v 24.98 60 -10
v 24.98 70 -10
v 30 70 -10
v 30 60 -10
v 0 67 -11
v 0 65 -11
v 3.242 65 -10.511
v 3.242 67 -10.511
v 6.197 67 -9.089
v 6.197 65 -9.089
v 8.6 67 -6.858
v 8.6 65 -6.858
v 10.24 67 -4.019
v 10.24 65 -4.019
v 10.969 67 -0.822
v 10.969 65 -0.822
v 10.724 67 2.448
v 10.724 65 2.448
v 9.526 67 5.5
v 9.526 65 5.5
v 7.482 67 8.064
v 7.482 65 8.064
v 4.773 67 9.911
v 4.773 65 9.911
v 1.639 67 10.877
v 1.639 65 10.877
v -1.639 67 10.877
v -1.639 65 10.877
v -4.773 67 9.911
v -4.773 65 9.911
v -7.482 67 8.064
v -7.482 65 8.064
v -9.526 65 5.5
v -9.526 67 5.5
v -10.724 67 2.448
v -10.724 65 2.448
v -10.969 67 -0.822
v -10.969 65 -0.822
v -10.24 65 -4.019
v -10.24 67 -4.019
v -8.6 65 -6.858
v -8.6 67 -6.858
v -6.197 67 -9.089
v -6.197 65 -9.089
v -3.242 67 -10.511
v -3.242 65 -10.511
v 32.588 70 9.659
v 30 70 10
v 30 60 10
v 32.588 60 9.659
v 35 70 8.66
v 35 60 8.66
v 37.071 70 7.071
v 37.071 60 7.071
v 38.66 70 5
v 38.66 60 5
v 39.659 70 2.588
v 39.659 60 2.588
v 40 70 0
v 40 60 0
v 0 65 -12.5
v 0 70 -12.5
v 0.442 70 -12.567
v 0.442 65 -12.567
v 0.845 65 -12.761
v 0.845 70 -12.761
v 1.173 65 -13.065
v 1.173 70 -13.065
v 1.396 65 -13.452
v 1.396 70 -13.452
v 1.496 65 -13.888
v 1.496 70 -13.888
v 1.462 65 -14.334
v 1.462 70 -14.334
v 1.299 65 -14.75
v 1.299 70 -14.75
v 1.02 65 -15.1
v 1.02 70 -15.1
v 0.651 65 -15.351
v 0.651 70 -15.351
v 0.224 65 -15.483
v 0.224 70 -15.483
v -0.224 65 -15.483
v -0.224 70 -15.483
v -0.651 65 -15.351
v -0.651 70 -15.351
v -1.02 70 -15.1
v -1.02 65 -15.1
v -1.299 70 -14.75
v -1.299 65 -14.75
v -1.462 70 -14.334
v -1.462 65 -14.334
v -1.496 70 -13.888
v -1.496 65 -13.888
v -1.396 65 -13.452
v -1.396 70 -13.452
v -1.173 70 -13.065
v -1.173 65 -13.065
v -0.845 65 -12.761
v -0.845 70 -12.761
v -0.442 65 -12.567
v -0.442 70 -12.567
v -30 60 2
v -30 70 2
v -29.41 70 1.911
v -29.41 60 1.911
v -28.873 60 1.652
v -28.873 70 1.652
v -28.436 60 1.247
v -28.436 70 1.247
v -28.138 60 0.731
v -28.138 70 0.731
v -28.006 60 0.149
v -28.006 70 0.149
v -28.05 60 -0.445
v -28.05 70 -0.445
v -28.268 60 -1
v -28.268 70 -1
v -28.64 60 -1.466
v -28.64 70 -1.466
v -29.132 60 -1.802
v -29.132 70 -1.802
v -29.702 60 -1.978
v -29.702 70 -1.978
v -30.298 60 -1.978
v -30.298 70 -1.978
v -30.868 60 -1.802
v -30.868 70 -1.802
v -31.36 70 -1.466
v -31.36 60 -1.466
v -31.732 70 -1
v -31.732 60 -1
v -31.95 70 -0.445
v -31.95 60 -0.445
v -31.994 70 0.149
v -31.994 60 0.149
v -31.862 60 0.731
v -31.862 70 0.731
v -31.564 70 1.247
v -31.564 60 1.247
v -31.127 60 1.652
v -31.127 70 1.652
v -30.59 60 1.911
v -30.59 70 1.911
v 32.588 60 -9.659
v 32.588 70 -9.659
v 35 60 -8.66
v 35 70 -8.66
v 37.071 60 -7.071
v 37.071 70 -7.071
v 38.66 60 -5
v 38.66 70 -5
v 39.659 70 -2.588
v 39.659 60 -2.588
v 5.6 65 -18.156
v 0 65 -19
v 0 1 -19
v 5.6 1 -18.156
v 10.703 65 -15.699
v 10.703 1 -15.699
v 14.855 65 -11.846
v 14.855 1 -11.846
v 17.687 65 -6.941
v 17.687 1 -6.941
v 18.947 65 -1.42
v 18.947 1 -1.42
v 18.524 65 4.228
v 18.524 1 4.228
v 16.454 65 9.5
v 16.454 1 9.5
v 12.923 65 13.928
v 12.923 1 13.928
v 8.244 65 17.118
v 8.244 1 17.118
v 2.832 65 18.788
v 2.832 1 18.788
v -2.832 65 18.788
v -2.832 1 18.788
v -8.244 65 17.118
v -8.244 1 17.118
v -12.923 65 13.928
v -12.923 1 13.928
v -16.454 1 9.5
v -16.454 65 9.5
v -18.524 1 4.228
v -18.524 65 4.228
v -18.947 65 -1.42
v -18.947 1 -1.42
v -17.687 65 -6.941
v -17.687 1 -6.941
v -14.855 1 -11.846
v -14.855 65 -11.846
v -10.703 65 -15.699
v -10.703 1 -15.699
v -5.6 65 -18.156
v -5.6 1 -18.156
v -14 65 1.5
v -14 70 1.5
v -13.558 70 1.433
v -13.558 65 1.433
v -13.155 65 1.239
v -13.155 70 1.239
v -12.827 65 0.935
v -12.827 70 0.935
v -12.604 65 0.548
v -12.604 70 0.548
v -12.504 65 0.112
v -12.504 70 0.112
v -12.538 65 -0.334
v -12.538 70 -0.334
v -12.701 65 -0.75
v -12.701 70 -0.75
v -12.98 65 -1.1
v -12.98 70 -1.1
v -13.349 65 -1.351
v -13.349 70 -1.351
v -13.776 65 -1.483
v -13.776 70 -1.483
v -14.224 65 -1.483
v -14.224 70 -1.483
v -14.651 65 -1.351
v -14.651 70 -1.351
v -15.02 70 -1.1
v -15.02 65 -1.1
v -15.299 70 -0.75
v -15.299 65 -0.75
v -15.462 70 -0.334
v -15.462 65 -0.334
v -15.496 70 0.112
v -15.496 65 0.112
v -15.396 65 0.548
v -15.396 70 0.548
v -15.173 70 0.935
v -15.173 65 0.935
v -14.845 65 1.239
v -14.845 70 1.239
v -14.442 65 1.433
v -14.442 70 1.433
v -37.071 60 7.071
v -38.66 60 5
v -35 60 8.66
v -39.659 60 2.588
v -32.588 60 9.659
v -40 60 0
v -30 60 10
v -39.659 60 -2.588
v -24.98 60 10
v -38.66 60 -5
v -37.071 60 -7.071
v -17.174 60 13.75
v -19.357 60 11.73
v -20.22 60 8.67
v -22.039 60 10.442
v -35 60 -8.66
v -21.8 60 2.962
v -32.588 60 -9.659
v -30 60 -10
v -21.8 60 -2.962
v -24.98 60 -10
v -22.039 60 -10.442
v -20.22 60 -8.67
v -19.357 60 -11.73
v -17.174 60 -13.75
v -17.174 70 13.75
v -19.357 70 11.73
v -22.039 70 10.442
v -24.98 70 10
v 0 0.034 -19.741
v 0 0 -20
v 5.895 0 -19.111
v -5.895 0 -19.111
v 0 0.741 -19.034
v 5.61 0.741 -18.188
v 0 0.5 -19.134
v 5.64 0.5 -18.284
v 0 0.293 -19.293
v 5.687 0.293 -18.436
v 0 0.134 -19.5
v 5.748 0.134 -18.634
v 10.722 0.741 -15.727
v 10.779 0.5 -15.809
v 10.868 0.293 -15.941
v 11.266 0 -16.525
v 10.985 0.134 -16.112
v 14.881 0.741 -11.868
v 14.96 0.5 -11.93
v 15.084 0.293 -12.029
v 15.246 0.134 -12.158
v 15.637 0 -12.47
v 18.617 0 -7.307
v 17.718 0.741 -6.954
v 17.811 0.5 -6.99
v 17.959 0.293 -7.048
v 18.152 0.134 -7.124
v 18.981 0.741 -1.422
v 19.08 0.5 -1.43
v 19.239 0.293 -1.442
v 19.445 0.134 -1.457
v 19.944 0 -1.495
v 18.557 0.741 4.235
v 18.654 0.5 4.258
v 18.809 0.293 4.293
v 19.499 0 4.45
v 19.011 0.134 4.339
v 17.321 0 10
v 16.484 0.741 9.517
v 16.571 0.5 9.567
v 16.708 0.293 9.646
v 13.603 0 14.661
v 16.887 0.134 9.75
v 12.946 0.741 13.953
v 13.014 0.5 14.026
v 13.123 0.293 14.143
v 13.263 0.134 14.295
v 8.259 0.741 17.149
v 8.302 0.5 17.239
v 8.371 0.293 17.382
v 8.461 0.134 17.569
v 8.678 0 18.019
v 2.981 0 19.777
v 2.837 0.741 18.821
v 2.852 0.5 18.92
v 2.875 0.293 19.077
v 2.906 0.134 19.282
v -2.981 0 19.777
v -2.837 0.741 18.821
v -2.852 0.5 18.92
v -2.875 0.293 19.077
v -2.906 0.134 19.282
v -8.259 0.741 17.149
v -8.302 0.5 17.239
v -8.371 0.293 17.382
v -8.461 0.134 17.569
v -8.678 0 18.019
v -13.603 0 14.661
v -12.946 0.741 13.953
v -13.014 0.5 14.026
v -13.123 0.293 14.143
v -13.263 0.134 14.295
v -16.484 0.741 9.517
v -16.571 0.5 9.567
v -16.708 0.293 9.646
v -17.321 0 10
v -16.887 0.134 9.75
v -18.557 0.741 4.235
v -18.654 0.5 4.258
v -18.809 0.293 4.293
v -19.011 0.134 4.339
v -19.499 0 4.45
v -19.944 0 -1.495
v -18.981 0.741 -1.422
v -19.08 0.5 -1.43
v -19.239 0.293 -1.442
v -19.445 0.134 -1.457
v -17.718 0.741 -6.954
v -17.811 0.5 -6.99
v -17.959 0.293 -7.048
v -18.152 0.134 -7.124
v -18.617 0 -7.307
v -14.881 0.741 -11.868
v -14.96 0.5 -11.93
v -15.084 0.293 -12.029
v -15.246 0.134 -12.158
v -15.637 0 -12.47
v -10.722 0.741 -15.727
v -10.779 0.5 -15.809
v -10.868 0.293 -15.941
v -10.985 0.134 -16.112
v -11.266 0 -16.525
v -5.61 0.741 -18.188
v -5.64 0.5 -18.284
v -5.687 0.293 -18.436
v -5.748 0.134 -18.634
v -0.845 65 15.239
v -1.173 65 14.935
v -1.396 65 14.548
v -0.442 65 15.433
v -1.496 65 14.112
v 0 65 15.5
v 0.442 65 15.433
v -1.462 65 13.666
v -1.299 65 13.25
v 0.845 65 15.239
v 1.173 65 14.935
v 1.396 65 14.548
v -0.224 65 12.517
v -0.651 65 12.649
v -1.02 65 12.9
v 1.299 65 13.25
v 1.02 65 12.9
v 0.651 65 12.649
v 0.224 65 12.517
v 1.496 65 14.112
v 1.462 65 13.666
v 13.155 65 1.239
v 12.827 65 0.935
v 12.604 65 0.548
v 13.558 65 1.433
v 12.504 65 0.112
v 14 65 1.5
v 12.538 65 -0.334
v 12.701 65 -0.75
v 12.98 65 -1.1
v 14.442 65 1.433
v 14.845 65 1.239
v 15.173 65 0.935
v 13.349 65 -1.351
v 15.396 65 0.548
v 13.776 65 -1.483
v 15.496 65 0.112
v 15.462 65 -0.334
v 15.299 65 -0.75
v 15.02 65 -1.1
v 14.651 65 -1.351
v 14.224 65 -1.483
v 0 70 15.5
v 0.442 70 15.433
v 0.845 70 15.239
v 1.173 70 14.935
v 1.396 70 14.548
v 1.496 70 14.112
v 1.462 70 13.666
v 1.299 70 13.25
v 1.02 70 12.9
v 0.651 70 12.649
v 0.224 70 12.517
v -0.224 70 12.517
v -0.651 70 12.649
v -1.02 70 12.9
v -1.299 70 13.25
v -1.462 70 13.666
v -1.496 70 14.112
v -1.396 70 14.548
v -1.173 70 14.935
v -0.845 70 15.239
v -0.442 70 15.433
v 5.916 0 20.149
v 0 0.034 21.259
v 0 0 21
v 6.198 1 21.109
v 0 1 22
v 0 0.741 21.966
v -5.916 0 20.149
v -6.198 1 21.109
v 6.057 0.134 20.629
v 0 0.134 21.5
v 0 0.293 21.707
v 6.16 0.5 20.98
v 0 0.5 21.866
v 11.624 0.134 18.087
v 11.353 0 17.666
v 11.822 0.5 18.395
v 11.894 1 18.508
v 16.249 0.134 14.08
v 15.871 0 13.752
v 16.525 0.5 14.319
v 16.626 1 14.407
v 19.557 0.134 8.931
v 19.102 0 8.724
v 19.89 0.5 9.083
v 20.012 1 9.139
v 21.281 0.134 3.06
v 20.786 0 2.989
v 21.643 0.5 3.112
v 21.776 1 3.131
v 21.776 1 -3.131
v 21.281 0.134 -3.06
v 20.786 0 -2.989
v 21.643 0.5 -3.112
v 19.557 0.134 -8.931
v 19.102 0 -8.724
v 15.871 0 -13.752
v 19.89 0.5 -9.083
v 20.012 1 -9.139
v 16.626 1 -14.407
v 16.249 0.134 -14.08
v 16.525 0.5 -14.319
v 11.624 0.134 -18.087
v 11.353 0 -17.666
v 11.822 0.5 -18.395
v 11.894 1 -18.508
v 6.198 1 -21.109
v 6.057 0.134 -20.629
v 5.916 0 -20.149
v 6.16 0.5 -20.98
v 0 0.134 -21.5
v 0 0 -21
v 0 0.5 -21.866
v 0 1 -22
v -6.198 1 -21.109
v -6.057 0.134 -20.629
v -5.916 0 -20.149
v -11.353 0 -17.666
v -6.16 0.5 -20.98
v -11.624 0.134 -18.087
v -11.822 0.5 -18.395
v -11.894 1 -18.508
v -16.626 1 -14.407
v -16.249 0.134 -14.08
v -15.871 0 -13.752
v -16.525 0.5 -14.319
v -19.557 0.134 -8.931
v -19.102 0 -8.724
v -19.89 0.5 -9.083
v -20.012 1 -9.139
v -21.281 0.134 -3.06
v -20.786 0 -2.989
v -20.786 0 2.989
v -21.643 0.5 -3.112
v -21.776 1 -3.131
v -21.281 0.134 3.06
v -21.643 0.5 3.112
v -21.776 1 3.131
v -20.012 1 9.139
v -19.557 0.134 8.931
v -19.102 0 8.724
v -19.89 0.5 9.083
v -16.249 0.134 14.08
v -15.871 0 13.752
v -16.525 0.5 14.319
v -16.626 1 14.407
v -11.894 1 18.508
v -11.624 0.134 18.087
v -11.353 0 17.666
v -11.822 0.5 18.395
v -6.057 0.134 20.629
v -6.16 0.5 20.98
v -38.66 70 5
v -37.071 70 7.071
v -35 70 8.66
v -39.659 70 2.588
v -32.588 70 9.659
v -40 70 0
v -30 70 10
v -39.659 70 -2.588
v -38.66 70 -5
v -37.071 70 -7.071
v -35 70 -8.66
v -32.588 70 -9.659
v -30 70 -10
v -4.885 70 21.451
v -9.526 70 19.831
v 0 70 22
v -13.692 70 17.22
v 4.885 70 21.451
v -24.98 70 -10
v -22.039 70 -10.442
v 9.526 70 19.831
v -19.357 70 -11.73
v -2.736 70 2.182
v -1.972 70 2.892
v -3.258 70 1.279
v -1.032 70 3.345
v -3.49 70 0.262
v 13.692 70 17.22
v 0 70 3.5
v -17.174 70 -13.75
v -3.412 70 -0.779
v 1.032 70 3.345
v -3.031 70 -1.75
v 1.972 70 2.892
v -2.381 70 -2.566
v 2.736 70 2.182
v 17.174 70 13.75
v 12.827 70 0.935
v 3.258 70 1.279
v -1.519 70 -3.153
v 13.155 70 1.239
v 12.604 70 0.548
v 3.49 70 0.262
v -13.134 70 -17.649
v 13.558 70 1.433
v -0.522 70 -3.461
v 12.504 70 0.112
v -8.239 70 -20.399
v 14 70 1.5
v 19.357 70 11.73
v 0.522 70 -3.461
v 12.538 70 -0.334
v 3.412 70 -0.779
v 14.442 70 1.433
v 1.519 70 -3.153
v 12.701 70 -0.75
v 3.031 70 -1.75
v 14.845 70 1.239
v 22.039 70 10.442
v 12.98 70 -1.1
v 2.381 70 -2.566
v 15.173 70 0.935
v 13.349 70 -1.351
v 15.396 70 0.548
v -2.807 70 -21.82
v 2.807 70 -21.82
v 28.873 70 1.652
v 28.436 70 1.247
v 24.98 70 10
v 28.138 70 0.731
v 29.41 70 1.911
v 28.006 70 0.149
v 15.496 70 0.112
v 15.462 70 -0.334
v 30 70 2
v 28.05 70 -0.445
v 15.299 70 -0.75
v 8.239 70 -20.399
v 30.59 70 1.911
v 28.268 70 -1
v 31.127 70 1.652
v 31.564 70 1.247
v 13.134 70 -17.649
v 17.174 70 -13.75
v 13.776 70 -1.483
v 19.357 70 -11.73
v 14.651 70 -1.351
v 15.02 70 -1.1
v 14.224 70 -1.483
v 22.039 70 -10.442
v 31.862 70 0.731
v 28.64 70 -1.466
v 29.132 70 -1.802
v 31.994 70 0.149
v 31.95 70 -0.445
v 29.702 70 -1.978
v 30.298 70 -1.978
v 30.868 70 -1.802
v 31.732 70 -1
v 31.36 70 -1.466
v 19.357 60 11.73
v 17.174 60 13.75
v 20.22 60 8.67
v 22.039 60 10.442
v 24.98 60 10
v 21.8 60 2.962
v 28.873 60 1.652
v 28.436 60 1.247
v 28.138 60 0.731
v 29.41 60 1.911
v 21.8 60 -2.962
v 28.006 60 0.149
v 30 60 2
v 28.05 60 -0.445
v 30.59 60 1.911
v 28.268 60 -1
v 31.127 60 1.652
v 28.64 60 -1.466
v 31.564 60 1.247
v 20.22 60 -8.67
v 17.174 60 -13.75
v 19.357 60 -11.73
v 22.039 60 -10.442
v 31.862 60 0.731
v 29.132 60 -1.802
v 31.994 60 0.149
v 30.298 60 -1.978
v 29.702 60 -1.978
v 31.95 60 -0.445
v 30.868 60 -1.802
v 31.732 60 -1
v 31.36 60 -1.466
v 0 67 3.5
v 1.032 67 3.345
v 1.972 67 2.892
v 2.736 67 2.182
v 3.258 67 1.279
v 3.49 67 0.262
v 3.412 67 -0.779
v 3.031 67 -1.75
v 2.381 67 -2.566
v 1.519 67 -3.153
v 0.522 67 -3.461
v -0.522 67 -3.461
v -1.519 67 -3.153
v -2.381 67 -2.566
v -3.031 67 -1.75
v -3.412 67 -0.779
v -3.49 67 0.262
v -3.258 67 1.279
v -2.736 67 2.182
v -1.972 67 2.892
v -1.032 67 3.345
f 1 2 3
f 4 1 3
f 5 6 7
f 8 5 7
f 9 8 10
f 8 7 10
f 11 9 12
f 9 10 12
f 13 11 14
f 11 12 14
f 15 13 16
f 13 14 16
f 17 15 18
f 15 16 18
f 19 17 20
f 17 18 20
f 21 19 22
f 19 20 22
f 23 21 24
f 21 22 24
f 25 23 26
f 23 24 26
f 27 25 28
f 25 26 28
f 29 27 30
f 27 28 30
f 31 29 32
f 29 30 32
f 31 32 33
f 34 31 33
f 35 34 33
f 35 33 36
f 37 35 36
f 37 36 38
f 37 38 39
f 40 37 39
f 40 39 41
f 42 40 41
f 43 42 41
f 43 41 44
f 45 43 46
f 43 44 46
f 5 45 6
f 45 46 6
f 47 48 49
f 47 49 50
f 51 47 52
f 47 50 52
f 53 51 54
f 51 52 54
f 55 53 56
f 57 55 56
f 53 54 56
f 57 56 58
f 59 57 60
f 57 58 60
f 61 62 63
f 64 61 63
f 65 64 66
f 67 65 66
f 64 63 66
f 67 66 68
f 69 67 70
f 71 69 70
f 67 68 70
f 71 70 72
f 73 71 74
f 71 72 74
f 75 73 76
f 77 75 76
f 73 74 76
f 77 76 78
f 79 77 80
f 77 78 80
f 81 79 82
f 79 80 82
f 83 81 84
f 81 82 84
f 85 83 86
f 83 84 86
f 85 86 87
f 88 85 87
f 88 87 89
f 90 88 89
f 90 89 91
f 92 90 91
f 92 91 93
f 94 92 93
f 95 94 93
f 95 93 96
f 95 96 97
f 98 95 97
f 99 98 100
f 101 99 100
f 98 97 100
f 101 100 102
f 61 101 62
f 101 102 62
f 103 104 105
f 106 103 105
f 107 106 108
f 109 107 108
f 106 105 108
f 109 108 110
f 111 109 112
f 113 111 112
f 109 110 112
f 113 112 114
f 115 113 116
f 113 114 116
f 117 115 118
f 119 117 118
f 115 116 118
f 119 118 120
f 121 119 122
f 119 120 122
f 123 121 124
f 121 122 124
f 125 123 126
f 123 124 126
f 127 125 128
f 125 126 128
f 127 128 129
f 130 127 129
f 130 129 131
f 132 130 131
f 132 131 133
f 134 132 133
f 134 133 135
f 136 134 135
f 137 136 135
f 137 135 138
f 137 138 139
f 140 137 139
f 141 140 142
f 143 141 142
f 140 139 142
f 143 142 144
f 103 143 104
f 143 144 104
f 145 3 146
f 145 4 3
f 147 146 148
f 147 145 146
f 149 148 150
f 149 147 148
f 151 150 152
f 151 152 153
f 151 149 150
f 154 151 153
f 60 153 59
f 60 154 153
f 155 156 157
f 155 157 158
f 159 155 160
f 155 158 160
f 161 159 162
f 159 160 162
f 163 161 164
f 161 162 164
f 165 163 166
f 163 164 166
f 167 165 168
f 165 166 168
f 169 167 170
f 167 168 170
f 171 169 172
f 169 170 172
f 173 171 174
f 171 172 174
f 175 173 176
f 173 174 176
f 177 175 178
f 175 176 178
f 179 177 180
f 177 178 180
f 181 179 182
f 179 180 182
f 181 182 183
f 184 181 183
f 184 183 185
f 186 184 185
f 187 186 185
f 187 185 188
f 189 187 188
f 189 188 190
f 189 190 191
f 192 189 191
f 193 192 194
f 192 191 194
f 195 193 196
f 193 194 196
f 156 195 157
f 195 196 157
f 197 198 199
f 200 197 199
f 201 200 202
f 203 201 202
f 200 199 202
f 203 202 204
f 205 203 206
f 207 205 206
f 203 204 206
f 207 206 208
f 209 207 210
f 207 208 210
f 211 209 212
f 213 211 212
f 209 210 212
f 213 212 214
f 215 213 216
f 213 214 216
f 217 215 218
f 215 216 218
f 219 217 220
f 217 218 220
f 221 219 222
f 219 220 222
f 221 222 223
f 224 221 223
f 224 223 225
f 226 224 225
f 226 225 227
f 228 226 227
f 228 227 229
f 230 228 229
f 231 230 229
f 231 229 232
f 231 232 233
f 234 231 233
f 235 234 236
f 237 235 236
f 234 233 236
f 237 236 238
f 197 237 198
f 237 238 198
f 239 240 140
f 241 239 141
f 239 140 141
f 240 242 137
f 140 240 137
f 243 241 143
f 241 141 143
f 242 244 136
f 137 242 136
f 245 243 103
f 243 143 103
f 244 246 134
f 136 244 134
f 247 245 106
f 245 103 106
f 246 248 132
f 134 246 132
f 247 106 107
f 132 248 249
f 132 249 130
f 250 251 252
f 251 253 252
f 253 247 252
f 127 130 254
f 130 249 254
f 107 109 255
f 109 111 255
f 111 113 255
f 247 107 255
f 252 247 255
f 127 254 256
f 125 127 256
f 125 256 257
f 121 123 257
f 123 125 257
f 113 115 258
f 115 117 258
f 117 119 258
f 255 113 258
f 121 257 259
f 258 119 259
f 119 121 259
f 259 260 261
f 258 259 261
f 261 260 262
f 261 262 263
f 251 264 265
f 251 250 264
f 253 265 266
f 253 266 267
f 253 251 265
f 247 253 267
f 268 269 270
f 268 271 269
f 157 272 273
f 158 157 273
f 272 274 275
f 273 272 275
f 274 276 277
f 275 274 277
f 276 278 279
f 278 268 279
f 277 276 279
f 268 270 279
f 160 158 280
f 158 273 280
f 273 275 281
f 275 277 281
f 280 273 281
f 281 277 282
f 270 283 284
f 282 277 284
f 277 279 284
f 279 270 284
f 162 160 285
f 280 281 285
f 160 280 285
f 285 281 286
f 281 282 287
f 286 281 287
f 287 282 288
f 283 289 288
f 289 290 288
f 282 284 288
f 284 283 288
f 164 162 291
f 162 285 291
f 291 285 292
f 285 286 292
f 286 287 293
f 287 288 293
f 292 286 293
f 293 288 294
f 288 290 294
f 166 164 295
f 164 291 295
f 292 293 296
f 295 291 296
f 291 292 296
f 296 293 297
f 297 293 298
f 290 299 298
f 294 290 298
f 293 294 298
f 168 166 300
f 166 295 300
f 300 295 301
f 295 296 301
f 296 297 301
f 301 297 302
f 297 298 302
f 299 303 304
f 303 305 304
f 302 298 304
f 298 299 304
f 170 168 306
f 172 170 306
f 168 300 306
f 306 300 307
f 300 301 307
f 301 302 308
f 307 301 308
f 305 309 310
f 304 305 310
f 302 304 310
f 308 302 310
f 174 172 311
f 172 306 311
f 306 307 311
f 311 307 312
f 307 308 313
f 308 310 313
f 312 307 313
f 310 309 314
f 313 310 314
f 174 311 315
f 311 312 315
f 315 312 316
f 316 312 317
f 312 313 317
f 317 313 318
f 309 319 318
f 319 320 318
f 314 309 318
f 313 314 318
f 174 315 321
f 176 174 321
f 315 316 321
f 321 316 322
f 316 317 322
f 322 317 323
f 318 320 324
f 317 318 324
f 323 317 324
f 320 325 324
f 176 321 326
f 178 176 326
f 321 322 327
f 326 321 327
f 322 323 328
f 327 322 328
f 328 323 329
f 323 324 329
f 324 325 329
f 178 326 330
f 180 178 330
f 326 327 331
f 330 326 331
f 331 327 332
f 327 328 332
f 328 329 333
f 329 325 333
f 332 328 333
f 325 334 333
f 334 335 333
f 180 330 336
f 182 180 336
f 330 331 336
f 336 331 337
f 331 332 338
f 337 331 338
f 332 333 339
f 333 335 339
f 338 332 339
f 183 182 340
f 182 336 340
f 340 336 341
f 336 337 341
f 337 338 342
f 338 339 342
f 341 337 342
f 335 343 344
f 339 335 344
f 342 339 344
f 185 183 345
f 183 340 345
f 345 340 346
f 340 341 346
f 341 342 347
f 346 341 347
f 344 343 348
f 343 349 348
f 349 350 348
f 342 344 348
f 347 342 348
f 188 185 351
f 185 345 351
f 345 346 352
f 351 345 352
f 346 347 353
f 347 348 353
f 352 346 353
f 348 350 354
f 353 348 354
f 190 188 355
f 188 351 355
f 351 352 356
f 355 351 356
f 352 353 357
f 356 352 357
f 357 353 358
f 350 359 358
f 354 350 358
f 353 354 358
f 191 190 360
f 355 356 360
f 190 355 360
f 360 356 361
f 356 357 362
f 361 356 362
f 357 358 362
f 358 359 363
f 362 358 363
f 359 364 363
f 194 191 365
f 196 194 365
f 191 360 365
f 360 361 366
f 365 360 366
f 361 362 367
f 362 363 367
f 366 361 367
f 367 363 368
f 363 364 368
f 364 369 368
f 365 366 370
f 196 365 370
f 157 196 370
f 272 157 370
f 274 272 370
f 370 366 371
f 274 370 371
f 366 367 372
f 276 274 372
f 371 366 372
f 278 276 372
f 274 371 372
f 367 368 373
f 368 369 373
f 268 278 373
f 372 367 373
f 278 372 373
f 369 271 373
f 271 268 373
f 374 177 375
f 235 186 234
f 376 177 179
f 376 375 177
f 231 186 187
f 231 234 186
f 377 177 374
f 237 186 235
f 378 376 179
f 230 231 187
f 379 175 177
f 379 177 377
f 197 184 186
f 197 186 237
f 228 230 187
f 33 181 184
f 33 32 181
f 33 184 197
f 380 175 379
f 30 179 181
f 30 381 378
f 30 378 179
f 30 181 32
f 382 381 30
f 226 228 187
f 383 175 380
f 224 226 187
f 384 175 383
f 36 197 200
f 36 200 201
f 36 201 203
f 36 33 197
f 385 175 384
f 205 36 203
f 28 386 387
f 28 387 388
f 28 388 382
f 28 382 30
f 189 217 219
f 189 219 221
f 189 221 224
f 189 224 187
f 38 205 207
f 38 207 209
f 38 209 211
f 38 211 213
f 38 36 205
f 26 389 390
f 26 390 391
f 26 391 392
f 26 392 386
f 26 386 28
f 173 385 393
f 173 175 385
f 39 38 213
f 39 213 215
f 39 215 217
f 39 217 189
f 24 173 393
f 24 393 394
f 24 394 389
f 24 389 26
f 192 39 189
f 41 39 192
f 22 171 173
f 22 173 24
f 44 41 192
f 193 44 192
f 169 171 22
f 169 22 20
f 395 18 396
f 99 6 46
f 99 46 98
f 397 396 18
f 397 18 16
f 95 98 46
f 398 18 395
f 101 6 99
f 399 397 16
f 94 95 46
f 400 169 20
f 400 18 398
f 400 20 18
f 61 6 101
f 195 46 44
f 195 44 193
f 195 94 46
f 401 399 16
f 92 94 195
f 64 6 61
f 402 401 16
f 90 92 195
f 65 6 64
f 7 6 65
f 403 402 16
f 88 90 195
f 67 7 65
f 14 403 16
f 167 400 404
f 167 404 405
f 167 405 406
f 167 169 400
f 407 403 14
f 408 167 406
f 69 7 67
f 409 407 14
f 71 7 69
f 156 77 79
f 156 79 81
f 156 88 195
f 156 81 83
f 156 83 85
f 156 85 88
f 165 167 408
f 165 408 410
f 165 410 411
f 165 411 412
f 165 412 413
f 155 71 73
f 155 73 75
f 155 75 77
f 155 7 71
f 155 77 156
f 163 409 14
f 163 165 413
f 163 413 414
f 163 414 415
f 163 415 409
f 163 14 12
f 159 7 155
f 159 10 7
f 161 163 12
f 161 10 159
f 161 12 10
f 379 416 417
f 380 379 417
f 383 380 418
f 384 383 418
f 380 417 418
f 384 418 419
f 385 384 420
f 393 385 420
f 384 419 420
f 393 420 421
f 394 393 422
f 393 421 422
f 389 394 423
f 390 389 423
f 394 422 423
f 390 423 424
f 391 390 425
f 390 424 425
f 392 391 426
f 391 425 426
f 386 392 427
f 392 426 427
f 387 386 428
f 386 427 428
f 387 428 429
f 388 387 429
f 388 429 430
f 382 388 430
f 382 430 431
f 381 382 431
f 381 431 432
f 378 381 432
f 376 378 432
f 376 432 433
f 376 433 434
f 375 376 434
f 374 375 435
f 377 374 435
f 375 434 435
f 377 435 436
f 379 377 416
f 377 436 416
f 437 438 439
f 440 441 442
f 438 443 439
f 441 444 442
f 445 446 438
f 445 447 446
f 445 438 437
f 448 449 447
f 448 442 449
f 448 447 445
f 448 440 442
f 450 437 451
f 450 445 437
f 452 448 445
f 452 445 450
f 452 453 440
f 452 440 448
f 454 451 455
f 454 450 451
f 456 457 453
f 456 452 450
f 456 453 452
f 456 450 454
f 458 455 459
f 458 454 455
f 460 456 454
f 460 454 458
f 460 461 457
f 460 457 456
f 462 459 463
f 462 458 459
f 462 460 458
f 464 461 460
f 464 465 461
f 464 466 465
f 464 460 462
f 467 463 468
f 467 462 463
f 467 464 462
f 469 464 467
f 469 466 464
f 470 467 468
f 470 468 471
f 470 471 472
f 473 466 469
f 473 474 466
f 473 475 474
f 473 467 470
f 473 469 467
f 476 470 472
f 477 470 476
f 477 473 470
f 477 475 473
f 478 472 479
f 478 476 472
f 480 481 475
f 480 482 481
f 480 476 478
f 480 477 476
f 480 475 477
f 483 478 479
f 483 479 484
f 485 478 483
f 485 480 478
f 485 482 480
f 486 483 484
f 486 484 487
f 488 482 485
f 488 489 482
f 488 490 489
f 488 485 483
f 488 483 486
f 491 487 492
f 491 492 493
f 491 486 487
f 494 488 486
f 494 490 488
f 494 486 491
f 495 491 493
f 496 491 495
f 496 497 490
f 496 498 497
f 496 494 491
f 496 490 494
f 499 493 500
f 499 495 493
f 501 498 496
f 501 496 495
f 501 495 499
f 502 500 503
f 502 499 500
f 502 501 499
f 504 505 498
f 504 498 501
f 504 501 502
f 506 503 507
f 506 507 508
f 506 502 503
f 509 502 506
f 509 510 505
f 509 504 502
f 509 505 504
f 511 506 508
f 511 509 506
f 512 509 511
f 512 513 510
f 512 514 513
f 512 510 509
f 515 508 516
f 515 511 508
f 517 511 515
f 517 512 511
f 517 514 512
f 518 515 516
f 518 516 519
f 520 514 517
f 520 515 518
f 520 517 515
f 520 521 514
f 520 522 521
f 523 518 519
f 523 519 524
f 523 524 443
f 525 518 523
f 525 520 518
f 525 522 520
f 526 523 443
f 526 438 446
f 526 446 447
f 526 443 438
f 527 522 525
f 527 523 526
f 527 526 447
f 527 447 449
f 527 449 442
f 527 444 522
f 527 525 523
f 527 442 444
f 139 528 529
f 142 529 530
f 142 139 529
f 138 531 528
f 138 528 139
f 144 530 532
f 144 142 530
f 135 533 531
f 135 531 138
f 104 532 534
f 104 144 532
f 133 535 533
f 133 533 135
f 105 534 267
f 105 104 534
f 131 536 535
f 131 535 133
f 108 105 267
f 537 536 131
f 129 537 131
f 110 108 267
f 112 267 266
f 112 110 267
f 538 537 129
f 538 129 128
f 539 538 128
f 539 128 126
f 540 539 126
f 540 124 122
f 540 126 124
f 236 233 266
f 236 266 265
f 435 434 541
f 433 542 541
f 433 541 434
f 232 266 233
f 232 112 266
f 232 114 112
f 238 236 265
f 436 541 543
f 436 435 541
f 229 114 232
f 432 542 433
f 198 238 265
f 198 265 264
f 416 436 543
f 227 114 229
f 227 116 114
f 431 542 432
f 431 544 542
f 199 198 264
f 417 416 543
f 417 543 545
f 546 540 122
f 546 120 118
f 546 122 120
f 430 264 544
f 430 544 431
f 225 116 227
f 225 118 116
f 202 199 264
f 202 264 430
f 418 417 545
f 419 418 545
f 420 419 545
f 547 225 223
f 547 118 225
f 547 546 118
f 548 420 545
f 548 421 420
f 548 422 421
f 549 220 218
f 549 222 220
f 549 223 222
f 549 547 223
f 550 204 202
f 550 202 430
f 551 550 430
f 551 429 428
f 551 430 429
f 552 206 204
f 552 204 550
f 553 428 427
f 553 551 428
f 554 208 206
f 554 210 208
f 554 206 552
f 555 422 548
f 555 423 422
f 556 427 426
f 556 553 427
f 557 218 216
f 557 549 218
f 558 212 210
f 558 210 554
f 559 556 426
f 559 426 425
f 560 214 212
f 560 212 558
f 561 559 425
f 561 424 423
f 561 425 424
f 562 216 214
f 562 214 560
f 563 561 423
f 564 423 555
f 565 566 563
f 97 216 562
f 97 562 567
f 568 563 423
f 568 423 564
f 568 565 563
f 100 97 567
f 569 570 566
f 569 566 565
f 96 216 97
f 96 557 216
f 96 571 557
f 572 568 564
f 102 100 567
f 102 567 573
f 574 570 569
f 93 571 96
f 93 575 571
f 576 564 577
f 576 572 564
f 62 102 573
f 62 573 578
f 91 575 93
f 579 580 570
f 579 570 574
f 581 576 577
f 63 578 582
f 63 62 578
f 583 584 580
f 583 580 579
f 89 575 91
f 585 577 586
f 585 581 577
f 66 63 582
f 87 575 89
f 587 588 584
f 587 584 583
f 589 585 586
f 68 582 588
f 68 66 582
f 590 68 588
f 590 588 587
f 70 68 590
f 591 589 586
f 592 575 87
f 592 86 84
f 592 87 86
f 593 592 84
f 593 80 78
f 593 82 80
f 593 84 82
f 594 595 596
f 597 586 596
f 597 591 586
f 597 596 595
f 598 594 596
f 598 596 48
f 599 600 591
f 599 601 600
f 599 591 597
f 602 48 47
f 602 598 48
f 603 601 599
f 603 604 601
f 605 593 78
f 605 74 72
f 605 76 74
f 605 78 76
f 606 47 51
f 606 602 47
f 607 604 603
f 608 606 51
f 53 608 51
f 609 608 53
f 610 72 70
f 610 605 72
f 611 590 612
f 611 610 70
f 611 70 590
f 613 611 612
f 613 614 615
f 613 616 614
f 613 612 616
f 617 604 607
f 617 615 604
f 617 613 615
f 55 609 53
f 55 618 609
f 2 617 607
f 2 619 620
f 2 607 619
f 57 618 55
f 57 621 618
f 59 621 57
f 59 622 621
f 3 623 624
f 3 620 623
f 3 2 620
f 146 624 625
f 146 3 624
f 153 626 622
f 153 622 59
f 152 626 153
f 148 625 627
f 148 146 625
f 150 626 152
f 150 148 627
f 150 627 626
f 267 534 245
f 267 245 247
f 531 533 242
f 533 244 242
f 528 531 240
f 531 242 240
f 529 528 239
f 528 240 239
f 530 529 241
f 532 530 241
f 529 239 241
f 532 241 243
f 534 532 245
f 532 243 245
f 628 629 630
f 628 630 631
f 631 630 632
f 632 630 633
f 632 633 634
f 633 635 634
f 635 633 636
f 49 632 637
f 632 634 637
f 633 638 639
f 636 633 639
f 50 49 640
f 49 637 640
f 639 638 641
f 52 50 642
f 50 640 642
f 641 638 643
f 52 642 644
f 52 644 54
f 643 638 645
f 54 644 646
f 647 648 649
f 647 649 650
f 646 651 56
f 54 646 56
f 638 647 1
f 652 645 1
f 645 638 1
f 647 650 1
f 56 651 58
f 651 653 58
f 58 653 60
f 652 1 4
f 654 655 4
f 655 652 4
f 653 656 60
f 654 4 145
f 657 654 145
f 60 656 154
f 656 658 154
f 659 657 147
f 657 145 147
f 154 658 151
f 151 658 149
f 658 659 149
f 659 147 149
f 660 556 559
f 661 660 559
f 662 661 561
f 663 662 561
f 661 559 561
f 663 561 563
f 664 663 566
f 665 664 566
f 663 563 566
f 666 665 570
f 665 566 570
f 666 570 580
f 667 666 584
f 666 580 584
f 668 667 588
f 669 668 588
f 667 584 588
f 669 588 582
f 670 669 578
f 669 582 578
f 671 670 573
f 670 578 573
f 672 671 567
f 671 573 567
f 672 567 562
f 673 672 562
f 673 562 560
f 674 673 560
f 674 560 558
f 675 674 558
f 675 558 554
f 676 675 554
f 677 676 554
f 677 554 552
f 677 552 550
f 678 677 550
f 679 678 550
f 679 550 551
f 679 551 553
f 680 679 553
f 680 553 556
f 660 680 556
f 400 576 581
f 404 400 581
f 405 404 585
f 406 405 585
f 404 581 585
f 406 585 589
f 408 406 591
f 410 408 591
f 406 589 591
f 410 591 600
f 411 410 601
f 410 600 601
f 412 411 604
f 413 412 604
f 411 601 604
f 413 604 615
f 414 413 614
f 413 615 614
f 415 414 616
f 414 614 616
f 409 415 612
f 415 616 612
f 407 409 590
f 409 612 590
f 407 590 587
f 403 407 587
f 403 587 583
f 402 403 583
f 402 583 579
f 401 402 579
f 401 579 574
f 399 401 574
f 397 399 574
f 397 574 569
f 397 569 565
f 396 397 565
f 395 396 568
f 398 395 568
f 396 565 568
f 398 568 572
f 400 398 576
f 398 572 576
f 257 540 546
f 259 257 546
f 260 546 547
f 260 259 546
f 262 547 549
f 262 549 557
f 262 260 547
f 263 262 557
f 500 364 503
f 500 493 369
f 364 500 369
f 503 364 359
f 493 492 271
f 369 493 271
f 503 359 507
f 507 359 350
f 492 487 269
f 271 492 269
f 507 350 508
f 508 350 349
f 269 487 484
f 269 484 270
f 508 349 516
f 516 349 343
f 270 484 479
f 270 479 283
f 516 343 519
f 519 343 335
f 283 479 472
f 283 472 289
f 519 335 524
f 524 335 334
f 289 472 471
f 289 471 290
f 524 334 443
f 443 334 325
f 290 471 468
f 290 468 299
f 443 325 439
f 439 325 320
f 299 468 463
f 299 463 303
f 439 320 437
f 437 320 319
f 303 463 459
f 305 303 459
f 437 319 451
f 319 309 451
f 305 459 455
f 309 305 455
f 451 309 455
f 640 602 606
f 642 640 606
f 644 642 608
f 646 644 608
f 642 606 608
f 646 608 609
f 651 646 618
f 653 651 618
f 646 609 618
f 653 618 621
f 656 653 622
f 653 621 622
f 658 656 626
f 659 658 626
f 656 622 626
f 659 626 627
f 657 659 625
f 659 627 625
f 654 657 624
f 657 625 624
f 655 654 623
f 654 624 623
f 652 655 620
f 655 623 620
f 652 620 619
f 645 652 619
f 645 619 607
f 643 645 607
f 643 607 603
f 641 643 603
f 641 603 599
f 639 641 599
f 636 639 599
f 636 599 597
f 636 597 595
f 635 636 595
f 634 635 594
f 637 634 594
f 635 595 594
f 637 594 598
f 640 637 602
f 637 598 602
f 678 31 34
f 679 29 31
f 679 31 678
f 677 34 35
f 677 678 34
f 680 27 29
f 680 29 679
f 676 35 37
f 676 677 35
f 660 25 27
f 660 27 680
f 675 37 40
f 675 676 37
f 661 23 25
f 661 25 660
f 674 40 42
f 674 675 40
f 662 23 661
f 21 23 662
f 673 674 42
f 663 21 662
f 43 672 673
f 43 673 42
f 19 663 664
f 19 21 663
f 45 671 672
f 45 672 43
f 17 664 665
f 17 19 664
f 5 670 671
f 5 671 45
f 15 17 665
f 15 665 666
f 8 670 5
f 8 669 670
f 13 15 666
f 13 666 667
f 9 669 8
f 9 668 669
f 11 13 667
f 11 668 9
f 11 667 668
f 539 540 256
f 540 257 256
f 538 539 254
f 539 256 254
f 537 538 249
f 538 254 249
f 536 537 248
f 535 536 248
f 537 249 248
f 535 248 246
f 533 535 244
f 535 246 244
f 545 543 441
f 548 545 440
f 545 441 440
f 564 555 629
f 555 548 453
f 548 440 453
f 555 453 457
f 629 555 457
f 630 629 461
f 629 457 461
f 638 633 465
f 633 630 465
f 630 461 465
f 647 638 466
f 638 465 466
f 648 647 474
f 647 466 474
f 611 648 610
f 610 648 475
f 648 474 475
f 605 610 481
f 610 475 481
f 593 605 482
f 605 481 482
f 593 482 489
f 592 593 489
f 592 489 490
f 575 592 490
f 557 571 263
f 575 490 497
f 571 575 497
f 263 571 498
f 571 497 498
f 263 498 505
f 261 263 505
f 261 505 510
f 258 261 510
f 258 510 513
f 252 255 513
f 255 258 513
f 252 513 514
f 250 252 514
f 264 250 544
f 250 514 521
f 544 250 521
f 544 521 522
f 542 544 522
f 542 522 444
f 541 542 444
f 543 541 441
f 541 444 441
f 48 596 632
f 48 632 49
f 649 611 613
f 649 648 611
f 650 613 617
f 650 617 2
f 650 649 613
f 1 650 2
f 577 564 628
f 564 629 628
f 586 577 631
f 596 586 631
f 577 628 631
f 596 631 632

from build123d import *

# Parameters (mm, degrees)
SKETCH3_R           = 22
BOSS_EXTRUDE1_DEPTH = 70
SKETCH14_W          = 80
SKETCH14_H          = 20
BOSS_EXTRUDE3_DEPTH = 10
SKETCH4_R           = 19
CUT_EXTRUDE1_DEPTH  = 65
SKETCH5_R           = 3.5
CUT_EXTRUDE2_DEPTH  = 5
SKETCH7_R           = 1.5
CUT_EXTRUDE3_DEPTH  = 5
SKETCH15_R          = 2
CUT_EXTRUDE6_DEPTH  = 10
FILLET1_R           = 10
FILLET2_R           = 10
FILLET3_R           = 10
FILLET4_R           = 1
SKETCH16_R          = 11
CUT_EXTRUDE7_DEPTH  = 2


with BuildPart() as part:
    # Sketch3 → Boss-Extrude1 (new body)
    with BuildSketch(Plane(origin=(0, 0, 0), x_dir=(1, 0, 0), z_dir=(0, 1, 0))):
        with Locations(Location((0, 0, 0), (0, 0, 270))):
            Circle(SKETCH3_R)
    extrude(amount=BOSS_EXTRUDE1_DEPTH)

    # Sketch14 → Boss-Extrude3 (add)
    with BuildSketch(Plane(origin=(0, 70, 0), x_dir=(1, 0, 0), z_dir=(0, 1, 0))):
        Rectangle(SKETCH14_W, SKETCH14_H)
    extrude(amount=-BOSS_EXTRUDE3_DEPTH)

    # Sketch4 → Cut-Extrude1 (cut)
    with BuildSketch(Plane(origin=(0, 0, 0), x_dir=(-1, 0, 0), z_dir=(0, -1, 0))):
        with Locations(Location((0, 0, 0), (0, 0, 90))):
            Circle(SKETCH4_R)
    extrude(amount=-CUT_EXTRUDE1_DEPTH, mode=Mode.SUBTRACT)

    # Sketch5 → Cut-Extrude2 (cut)
    with BuildSketch(Plane(origin=(0, 70, 0), x_dir=(1, 0, 0), z_dir=(0, 1, 0))):
        with Locations(Location((0, 0, 0), (0, 0, 270))):
            Circle(SKETCH5_R)
    extrude(amount=-CUT_EXTRUDE2_DEPTH, mode=Mode.SUBTRACT)

    # Sketch7 → Cut-Extrude3 (cut)
    with BuildSketch(Plane(origin=(0, 70, 0), x_dir=(1, 0, 0), z_dir=(0, 1, 0))):
        with Locations(Location((0, -14, 0), (0, 0, 270))):
            Circle(SKETCH7_R)
        with Locations(Location((0, 14, 0), (0, 0, 270))):
            Circle(SKETCH7_R)
        with Locations(Location((14, 0, 0), (0, 0, 270))):
            Circle(SKETCH7_R)
        with Locations(Location((-14, 0, 0), (0, 0, 270))):
            Circle(SKETCH7_R)
    extrude(amount=-CUT_EXTRUDE3_DEPTH, mode=Mode.SUBTRACT)

    # Sketch15 → Cut-Extrude6 (cut)
    with BuildSketch(Plane(origin=(0, 70, 0), x_dir=(1, 0, 0), z_dir=(0, 1, 0))):
        with Locations(Location((30, 0, 0), (0, 0, 270))):
            Circle(SKETCH15_R)
        with Locations(Location((-30, 0, 0), (0, 0, 270))):
            Circle(SKETCH15_R)
    extrude(amount=-CUT_EXTRUDE6_DEPTH, mode=Mode.SUBTRACT)

    # Fillet1
    fillet1_edges = [part.edges().sort_by_distance(p)[0] for p in [
        (40, 65, -10),
        (40, 65, 10),
    ]]
    fillet(fillet1_edges, radius=FILLET1_R - 0.0001)  # a hair under: the kernel refuses the full size

    # Fillet2
    fillet2_edges = [part.edges().sort_by_distance(p)[0] for p in [
        (-40, 65, -10),
        (-40, 65, 10),
    ]]
    fillet(fillet2_edges, radius=FILLET2_R - 0.0001)  # a hair under: the kernel refuses the full size

    # Fillet3
    fillet3_edges = [part.edges().sort_by_distance(p)[0] for p in [
        (-19.595917942, 65, 10),
        (19.595917942, 65, 10),
        (19.595917942, 65, -10),
        (-19.595917942, 65, -10),
    ]]
    fillet(fillet3_edges, radius=FILLET3_R)

    # Fillet4
    fillet4_edges = [part.edges().sort_by_distance(p)[0] for p in [
        (0, 0, -22),
        (0, 0, 19),
    ]]
    fillet(fillet4_edges, radius=FILLET4_R)

    # Sketch16 → Cut-Extrude7 (cut)
    with BuildSketch(Plane.XZ.offset(-65)):
        with Locations(Location((0, 0, 0), (0, 0, 270))):
            Circle(SKETCH16_R)
    extrude(amount=-CUT_EXTRUDE7_DEPTH, mode=Mode.SUBTRACT)


solid = part.part
